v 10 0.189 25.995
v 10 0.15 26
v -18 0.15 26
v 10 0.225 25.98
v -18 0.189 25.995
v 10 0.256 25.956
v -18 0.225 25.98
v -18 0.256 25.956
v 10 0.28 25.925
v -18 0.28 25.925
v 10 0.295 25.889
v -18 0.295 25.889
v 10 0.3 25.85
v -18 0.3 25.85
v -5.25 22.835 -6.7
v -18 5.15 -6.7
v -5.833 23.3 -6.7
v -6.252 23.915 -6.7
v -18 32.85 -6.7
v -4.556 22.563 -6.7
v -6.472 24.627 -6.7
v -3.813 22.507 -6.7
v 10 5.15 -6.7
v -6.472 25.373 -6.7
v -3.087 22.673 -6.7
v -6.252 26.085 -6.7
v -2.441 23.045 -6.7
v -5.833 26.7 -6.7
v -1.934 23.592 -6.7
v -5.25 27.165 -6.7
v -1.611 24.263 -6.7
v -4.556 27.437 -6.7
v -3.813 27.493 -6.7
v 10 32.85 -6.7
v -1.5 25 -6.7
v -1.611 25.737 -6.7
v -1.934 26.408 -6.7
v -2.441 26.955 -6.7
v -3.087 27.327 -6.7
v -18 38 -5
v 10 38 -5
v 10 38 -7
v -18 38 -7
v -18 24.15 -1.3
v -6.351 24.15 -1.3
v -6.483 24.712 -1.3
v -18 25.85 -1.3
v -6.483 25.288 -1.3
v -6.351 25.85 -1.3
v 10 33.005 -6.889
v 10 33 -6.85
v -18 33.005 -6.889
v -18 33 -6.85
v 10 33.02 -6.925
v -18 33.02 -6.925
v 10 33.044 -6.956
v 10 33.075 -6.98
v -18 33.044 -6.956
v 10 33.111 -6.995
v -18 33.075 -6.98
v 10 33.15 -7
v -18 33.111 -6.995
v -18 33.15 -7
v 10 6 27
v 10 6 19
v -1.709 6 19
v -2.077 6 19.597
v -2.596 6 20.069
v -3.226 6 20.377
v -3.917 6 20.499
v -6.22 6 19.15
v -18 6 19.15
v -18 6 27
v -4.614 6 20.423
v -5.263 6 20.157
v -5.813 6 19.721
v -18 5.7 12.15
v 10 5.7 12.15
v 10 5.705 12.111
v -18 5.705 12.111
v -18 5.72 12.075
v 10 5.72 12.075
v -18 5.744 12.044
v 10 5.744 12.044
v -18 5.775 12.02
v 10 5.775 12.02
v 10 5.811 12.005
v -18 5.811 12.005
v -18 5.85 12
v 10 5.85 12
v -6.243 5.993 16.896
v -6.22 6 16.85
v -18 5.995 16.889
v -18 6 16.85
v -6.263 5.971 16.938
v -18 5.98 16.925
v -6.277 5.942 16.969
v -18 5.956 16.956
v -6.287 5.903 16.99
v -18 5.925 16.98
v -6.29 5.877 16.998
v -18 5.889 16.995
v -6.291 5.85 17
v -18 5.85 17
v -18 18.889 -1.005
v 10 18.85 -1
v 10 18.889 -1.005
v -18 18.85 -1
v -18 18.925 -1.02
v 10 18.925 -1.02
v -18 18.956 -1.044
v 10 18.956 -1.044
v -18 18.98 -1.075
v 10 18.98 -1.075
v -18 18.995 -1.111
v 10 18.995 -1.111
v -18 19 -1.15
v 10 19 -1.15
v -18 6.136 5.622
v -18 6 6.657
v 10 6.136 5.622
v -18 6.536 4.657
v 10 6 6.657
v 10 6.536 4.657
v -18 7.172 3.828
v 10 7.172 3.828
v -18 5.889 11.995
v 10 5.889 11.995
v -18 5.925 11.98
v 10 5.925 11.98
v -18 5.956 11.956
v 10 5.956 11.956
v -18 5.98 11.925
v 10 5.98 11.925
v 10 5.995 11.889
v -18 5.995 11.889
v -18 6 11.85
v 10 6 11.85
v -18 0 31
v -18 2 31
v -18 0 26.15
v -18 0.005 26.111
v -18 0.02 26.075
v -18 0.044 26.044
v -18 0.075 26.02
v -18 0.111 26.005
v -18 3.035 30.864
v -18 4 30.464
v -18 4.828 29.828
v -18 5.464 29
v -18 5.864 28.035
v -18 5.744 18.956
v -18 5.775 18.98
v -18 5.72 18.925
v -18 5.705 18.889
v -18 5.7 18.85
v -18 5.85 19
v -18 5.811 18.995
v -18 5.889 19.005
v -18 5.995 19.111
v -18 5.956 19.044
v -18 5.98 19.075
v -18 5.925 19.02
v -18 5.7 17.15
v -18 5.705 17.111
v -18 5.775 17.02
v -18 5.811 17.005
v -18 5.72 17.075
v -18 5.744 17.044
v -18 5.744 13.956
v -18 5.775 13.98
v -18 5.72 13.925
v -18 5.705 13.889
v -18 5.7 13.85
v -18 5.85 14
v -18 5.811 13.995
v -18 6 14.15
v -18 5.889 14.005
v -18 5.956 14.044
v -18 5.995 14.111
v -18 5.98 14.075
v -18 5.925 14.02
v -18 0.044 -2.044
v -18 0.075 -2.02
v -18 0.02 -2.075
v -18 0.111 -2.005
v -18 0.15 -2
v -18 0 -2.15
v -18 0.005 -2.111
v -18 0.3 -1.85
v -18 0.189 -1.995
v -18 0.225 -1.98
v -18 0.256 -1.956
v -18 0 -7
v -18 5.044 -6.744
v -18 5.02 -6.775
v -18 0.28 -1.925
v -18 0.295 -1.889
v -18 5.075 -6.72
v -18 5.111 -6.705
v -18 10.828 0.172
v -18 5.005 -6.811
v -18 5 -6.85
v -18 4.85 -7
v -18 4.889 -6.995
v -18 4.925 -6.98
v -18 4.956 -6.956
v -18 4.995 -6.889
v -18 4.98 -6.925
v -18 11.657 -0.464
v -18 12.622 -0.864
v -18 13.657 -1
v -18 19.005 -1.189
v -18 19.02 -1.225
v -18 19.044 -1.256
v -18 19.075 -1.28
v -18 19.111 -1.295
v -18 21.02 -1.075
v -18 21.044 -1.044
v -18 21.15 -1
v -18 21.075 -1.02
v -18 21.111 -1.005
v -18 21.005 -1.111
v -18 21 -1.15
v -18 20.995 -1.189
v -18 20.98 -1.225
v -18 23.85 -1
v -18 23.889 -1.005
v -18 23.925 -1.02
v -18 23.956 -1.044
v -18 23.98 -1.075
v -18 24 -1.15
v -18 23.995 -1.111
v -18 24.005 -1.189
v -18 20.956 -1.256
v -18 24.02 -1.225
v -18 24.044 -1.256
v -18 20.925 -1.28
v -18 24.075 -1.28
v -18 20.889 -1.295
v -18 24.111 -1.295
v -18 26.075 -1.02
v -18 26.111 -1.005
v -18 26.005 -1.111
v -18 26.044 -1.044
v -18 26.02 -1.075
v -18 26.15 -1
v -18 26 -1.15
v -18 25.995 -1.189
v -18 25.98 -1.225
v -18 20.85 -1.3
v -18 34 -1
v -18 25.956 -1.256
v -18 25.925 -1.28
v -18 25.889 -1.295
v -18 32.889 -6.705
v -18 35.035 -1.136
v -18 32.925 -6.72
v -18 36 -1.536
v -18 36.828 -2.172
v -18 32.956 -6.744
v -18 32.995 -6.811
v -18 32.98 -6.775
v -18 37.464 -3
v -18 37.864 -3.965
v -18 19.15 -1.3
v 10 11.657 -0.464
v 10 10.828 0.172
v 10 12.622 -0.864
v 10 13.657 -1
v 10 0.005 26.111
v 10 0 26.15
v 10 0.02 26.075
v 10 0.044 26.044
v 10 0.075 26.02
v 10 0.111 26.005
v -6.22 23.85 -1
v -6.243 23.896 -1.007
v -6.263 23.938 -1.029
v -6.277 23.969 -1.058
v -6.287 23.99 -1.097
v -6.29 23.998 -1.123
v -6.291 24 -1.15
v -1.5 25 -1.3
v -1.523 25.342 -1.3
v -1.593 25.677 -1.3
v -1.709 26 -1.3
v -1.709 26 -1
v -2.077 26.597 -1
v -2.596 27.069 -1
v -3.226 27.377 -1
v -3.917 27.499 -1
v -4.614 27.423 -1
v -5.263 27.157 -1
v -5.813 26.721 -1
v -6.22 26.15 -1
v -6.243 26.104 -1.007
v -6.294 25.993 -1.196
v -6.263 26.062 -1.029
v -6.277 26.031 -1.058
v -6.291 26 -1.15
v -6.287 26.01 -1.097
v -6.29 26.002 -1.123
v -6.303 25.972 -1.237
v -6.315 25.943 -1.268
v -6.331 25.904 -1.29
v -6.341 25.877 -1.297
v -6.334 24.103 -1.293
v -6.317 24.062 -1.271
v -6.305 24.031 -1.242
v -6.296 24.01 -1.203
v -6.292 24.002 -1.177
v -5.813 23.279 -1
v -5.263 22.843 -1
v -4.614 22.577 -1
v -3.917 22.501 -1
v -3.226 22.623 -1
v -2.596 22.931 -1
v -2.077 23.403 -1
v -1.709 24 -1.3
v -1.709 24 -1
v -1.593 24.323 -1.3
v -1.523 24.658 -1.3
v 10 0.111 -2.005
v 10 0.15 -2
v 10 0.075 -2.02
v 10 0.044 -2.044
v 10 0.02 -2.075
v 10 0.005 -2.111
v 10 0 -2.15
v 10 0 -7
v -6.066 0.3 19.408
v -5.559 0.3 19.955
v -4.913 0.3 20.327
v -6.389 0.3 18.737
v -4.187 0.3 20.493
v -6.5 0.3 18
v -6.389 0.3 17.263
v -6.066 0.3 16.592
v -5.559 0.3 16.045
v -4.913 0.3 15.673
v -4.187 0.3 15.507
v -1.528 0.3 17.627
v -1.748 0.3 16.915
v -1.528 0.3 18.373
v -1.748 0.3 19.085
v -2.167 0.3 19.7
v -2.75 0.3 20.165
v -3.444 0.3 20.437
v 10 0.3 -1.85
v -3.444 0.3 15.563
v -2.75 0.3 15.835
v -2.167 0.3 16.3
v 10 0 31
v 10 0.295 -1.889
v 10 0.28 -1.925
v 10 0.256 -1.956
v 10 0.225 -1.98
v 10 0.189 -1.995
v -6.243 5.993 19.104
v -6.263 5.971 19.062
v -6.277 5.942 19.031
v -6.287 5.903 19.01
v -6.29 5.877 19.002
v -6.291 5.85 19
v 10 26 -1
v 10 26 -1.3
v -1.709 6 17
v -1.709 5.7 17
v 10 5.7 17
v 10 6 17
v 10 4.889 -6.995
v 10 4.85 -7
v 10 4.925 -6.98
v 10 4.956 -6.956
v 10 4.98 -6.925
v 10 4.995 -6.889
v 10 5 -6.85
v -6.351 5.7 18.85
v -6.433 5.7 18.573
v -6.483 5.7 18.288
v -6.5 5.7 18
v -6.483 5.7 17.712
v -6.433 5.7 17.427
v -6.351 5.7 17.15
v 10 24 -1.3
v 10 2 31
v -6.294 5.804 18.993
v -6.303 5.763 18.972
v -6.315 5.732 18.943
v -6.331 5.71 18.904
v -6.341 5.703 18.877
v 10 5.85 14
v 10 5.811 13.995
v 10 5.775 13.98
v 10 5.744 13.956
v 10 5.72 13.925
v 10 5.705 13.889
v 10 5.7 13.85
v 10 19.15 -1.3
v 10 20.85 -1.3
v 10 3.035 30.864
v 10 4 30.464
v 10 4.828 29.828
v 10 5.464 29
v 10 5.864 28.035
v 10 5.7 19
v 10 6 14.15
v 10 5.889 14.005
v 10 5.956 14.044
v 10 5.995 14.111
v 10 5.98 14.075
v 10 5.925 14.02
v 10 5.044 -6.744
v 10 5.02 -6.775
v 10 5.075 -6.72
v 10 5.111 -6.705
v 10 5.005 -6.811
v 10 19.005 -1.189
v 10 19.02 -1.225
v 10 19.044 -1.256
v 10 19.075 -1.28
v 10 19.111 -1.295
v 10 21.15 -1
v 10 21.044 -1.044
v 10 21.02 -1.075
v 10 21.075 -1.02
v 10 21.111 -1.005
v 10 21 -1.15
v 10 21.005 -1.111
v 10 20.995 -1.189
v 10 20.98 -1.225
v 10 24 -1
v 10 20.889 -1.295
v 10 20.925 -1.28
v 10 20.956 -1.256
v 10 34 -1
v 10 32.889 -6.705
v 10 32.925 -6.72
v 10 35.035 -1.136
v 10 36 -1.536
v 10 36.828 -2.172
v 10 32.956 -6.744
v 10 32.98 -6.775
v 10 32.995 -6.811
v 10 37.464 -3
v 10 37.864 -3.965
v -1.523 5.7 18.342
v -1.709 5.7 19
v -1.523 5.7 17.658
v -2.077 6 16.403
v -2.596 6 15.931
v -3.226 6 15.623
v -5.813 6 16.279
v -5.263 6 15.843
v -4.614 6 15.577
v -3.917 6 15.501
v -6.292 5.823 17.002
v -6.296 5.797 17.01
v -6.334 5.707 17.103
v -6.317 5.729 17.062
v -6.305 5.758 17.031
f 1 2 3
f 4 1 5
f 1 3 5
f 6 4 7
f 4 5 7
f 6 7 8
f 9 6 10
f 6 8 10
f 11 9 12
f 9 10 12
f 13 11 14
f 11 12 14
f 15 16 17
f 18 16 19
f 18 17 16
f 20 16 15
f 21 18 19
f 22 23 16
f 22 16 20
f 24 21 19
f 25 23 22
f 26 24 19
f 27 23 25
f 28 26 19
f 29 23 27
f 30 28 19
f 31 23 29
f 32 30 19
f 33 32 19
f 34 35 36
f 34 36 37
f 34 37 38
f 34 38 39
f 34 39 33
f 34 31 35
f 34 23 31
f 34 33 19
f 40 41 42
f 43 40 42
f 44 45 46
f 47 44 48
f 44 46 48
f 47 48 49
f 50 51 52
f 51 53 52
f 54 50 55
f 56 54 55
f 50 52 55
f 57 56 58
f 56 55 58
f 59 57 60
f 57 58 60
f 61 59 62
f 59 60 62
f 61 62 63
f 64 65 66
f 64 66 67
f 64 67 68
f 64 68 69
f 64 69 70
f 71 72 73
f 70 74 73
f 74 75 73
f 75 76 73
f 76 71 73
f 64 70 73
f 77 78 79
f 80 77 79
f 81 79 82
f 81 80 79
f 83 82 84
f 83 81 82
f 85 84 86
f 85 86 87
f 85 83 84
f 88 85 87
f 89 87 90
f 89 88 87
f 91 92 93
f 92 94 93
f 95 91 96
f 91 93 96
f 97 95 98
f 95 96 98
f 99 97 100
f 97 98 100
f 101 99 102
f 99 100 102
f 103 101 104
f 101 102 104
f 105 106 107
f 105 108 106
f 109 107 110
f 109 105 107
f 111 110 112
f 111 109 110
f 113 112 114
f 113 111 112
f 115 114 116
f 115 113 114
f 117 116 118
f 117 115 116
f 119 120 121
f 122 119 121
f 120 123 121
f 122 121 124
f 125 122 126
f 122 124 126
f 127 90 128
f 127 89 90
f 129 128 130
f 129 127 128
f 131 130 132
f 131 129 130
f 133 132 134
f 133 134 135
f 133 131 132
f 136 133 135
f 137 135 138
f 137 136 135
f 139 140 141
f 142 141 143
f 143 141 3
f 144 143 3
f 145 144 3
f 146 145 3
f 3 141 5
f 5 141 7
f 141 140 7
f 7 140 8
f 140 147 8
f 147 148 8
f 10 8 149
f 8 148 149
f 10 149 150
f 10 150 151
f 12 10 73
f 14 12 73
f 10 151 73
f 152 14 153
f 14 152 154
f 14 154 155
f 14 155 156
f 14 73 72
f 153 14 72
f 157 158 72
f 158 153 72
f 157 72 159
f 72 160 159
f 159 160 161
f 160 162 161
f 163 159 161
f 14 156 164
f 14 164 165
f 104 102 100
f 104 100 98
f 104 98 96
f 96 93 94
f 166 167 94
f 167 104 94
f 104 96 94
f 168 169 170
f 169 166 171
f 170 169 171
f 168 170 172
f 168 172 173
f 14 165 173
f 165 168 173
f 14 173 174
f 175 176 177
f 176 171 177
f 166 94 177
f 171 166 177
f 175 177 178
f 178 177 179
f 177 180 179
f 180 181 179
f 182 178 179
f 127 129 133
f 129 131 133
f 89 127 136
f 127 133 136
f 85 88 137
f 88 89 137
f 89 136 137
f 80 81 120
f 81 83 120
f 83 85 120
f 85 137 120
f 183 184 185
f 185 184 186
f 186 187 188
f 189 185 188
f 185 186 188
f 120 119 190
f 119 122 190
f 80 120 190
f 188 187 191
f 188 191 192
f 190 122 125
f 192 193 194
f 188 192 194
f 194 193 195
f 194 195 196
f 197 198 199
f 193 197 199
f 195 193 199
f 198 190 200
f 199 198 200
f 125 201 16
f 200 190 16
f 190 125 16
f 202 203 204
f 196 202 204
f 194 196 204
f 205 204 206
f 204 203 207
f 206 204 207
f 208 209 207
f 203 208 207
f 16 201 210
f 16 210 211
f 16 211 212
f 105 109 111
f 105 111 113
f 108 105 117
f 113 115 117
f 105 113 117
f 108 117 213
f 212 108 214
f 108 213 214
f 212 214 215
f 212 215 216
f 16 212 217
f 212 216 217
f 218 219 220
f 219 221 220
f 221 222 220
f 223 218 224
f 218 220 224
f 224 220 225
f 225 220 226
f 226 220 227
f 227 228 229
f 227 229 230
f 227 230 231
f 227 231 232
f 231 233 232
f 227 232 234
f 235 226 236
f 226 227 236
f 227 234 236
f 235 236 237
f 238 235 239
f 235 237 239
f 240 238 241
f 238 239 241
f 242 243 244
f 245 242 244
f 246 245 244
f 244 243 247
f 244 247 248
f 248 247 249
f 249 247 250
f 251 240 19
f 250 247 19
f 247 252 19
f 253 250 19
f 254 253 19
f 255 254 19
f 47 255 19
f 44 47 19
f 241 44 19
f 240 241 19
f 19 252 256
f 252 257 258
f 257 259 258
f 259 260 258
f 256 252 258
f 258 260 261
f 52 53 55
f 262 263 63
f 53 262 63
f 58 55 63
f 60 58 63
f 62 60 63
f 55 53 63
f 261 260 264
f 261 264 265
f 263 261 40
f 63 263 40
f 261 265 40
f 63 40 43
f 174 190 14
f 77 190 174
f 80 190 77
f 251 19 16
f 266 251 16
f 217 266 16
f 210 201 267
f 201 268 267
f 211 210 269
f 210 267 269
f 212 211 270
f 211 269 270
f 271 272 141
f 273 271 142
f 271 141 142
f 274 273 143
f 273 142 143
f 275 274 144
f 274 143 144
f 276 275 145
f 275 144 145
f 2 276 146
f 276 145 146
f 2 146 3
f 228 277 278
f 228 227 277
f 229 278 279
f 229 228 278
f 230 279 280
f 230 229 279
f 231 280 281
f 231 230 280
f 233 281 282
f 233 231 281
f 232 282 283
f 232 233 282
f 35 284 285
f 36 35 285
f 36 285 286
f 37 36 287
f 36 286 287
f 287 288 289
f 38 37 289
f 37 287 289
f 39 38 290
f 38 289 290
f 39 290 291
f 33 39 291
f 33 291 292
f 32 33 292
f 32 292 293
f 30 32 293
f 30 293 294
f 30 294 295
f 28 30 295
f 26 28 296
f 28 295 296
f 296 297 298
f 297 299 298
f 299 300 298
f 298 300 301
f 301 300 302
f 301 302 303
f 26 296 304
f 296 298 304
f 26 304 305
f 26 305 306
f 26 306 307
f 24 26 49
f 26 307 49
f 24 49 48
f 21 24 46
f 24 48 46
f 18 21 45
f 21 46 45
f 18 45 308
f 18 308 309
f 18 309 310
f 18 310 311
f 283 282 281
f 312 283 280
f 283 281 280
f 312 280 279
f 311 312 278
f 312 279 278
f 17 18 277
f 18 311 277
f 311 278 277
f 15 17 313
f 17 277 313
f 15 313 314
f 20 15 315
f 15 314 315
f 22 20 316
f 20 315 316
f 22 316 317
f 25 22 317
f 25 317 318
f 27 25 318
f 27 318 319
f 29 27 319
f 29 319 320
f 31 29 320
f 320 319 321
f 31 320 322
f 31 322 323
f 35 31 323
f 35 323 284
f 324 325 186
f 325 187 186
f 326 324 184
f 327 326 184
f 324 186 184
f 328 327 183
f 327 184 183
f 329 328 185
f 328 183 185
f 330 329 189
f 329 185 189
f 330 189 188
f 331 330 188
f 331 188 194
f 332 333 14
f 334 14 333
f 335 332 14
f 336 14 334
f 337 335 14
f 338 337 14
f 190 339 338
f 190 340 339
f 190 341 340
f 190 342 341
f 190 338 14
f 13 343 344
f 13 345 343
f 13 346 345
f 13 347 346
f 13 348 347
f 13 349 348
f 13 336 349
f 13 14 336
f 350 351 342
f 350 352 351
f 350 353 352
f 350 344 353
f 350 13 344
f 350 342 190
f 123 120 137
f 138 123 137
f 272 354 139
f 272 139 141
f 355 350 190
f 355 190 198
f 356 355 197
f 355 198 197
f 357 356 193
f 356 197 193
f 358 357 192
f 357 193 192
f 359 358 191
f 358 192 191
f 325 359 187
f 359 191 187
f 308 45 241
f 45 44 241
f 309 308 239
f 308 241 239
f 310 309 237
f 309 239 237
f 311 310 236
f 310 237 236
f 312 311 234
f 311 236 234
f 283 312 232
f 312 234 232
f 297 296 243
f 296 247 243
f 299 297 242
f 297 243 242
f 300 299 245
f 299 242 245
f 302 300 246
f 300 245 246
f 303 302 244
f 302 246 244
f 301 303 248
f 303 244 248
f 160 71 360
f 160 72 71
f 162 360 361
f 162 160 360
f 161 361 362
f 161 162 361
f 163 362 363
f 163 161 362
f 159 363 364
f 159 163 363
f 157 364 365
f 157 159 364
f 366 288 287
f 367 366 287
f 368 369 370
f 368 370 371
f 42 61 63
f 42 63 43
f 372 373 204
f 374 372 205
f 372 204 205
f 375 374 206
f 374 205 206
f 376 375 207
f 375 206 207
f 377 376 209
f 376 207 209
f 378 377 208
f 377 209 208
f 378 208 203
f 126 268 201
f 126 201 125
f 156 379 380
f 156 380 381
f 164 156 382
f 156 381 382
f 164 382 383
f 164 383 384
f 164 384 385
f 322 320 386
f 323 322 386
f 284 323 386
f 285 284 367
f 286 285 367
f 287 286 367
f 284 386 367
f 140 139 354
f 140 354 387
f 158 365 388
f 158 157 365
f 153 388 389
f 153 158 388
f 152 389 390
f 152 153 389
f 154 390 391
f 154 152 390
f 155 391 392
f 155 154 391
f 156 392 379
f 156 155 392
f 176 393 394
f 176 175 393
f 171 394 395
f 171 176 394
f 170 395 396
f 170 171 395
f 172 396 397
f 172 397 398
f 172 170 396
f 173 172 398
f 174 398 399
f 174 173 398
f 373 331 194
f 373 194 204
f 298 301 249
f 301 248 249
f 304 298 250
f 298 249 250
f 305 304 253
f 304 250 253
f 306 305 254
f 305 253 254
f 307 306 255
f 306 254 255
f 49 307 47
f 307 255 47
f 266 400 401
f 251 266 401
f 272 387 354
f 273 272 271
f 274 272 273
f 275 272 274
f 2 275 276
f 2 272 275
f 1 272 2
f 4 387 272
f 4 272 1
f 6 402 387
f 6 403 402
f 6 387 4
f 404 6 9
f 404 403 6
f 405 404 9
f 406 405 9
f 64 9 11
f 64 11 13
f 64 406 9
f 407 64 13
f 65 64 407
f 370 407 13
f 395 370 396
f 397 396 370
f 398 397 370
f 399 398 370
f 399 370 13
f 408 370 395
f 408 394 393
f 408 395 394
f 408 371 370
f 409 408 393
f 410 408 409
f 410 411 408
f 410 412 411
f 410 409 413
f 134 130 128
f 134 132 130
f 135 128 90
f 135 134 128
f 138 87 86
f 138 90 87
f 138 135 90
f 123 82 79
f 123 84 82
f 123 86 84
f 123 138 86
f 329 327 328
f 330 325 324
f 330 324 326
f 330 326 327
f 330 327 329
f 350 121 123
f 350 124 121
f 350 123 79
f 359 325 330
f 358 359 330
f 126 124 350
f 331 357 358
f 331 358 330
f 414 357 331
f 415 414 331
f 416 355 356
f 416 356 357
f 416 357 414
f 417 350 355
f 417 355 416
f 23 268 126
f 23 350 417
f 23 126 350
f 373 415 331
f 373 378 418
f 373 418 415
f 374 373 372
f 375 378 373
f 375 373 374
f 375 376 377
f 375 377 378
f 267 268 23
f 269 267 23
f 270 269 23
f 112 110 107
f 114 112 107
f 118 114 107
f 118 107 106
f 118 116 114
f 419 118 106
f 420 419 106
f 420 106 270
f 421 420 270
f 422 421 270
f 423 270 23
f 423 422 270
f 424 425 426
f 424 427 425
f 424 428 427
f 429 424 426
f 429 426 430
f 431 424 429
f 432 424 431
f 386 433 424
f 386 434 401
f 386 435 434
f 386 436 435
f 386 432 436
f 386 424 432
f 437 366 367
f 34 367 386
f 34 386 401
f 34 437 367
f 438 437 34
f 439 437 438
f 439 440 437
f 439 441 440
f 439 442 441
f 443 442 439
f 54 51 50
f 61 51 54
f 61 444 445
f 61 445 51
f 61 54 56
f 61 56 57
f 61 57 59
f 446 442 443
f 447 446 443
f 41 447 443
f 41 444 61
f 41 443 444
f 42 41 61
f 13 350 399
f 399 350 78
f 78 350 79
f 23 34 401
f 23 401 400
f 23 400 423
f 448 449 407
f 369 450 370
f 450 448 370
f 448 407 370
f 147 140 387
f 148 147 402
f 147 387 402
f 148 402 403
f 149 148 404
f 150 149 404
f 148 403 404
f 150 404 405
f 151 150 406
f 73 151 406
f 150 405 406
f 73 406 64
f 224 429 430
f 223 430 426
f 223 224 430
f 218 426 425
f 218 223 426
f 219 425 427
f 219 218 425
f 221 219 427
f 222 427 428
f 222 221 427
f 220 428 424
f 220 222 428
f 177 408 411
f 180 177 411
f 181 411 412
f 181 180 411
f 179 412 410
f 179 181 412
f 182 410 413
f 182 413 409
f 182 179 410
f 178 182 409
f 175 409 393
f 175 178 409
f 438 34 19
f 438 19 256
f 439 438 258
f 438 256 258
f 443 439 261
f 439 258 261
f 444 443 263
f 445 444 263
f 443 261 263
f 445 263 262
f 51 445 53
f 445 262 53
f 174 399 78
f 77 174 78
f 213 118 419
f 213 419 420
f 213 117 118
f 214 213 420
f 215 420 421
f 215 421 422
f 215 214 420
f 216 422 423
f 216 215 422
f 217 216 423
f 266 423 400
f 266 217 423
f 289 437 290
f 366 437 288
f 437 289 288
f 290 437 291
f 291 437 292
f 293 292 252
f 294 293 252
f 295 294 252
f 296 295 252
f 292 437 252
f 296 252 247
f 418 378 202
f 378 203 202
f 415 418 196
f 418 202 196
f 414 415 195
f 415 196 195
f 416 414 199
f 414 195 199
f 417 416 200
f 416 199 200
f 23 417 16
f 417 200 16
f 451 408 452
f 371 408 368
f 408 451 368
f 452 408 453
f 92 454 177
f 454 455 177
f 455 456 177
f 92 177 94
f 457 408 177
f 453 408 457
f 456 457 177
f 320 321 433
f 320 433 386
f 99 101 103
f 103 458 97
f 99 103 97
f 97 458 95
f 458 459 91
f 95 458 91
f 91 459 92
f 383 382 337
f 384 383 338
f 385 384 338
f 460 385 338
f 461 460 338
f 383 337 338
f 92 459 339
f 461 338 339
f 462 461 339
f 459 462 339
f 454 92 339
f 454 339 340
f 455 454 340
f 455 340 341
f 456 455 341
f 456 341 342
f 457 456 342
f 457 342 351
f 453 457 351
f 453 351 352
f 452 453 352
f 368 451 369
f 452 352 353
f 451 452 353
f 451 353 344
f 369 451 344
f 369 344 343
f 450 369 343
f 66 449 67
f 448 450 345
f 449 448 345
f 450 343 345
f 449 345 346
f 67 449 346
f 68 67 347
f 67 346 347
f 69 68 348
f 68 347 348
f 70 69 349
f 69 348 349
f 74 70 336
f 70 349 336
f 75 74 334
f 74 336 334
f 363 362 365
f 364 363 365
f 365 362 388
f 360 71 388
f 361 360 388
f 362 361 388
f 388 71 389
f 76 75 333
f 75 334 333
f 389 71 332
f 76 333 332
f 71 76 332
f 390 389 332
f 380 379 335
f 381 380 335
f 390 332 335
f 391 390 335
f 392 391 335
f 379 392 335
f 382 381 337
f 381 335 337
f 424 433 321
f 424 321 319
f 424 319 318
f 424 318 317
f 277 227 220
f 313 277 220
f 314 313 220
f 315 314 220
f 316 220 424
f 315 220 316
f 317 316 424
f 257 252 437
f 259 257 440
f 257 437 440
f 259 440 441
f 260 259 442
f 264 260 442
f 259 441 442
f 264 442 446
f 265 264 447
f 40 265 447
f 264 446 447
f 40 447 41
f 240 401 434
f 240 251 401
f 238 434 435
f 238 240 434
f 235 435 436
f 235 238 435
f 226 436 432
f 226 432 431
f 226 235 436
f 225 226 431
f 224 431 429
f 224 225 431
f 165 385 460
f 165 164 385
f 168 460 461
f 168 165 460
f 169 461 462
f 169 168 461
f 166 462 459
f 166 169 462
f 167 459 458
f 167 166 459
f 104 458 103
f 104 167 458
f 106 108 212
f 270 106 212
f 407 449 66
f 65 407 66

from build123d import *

# Parameters (mm, degrees)
ESBO_O1_W                  = 38
ESBO_O1_H                  = 38
RESSALTO_EXTRUS_O1_DEPTH   = 28
CORTE_EXTRUS_O1_DEPTH      = 57.471231614
ESBO_O7_W                  = 0.3
ESBO_O7_H                  = 28
ESBO_O7_W_2                = 28
ESBO_O7_H_2                = 0.3
ESBO_O7_W_3                = 2
ESBO_O7_H_3                = 2
CORTE_EXTRUS_O2_DEPTH      = 57.471231614
FURO_DE_DI_METRO_7_0_7_3_D = 5
FURO_DE_DI_METRO_7_0_7_2_D = 5
FILETE1_R                  = 4
FILETE2_R                  = 0.15


with BuildPart() as part:
    # Esboço1 → Ressalto-extrusão1 (new body)
    with BuildSketch(Plane(origin=(10, 0, 0), x_dir=(0, 0, -1), z_dir=(1, 0, 0))):
        with Locations((-12, 19)):
            Rectangle(ESBO_O1_W, ESBO_O1_H)
    extrude(amount=-RESSALTO_EXTRUS_O1_DEPTH)

    # Esboço2 → Corte-extrusão1 (cut, through all)
    with BuildSketch(Plane.ZY.offset(18)):
        Polygon((31, 38), (-1, 38), (-1, 12), (5, 6), (31, 6), align=None)
    extrude(amount=-CORTE_EXTRUS_O1_DEPTH, mode=Mode.SUBTRACT)

    # Esboço7 → Corte-extrusão2 (cut, through all)
    with BuildSketch(Plane(origin=(10, 0, 0), x_dir=(0, 0, -1), z_dir=(1, 0, 0))):
        with Locations((6.85, 19)):
            Rectangle(ESBO_O7_W, ESBO_O7_H)
        with Locations((-12, 0.15)):
            Rectangle(ESBO_O7_W_2, ESBO_O7_H_2)
        with Locations((-13, 5.85)):
            Rectangle(ESBO_O7_W_3, ESBO_O7_H_2)
        with Locations((1.15, 20)):
            Rectangle(ESBO_O7_W, ESBO_O7_H_3)
        with Locations((-18, 5.85)):
            Rectangle(ESBO_O7_W_3, ESBO_O7_H_2)
        with Locations((1.15, 25)):
            Rectangle(ESBO_O7_W, ESBO_O7_H_3)
    extrude(amount=-CORTE_EXTRUS_O2_DEPTH, mode=Mode.SUBTRACT)

    # Furo de diâmetro Ø7.0 (7)3 (through all)
    with Locations(Plane(origin=(0, 6, 0), x_dir=(1, 0, 0), z_dir=(0, 1, 0))):
        with Locations((-4, -18)):
            Hole(FURO_DE_DI_METRO_7_0_7_3_D / 2)

    # Furo de diâmetro Ø7.0 (7)2 (through all)
    with Locations(Plane(origin=(0, 0, -7), x_dir=(-1, 0, 0), z_dir=(0, 0, -1))):
        with Locations((4, 25)):
            Hole(FURO_DE_DI_METRO_7_0_7_2_D / 2)

    # Filete1
    filete1_edges = [part.edges().sort_by_distance(p)[0] for p in [
        (-4, 6, 31),
        (-4, 6, 5),
        (-4, 12, -1),
        (-4, 38, -1),
    ]]
    fillet(filete1_edges, radius=FILETE1_R)

    # Filete2
    filete2_edges = [part.edges().sort_by_distance(p)[0] for p in [
        (-4, 5, -7),
        (-4, 5, -6.7),
        (-4, 33, -7),
        (-4, 33, -6.7),
        (-4, 0, 26),
        (-4, 0.3, 26),
        (-4, 0.3, -2),
        (-4, 0, -2),
        (-4, 19, -1.3),
        (-4, 19, -1),
        (-4, 21, -1.3),
        (-4, 21, -1),
        (-4, 5.7, 14),
        (-4, 6, 14),
        (-4, 5.7, 12),
        (-4, 6, 12),
        (-12.145643924, 26, -1.3),
        (-12.145643924, 24, -1.3),
        (-12.145643924, 24, -1),
        (-12.145643924, 26, -1),
        (-12.145643924, 5.7, 19),
        (-12.145643924, 5.7, 17),
        (-12.145643924, 6, 17),
        (-12.145643924, 6, 19),
    ]]
    fillet(filete2_edges, radius=FILETE2_R - 0.0001)  # a hair under: the kernel refuses the full size


solid = part.part
